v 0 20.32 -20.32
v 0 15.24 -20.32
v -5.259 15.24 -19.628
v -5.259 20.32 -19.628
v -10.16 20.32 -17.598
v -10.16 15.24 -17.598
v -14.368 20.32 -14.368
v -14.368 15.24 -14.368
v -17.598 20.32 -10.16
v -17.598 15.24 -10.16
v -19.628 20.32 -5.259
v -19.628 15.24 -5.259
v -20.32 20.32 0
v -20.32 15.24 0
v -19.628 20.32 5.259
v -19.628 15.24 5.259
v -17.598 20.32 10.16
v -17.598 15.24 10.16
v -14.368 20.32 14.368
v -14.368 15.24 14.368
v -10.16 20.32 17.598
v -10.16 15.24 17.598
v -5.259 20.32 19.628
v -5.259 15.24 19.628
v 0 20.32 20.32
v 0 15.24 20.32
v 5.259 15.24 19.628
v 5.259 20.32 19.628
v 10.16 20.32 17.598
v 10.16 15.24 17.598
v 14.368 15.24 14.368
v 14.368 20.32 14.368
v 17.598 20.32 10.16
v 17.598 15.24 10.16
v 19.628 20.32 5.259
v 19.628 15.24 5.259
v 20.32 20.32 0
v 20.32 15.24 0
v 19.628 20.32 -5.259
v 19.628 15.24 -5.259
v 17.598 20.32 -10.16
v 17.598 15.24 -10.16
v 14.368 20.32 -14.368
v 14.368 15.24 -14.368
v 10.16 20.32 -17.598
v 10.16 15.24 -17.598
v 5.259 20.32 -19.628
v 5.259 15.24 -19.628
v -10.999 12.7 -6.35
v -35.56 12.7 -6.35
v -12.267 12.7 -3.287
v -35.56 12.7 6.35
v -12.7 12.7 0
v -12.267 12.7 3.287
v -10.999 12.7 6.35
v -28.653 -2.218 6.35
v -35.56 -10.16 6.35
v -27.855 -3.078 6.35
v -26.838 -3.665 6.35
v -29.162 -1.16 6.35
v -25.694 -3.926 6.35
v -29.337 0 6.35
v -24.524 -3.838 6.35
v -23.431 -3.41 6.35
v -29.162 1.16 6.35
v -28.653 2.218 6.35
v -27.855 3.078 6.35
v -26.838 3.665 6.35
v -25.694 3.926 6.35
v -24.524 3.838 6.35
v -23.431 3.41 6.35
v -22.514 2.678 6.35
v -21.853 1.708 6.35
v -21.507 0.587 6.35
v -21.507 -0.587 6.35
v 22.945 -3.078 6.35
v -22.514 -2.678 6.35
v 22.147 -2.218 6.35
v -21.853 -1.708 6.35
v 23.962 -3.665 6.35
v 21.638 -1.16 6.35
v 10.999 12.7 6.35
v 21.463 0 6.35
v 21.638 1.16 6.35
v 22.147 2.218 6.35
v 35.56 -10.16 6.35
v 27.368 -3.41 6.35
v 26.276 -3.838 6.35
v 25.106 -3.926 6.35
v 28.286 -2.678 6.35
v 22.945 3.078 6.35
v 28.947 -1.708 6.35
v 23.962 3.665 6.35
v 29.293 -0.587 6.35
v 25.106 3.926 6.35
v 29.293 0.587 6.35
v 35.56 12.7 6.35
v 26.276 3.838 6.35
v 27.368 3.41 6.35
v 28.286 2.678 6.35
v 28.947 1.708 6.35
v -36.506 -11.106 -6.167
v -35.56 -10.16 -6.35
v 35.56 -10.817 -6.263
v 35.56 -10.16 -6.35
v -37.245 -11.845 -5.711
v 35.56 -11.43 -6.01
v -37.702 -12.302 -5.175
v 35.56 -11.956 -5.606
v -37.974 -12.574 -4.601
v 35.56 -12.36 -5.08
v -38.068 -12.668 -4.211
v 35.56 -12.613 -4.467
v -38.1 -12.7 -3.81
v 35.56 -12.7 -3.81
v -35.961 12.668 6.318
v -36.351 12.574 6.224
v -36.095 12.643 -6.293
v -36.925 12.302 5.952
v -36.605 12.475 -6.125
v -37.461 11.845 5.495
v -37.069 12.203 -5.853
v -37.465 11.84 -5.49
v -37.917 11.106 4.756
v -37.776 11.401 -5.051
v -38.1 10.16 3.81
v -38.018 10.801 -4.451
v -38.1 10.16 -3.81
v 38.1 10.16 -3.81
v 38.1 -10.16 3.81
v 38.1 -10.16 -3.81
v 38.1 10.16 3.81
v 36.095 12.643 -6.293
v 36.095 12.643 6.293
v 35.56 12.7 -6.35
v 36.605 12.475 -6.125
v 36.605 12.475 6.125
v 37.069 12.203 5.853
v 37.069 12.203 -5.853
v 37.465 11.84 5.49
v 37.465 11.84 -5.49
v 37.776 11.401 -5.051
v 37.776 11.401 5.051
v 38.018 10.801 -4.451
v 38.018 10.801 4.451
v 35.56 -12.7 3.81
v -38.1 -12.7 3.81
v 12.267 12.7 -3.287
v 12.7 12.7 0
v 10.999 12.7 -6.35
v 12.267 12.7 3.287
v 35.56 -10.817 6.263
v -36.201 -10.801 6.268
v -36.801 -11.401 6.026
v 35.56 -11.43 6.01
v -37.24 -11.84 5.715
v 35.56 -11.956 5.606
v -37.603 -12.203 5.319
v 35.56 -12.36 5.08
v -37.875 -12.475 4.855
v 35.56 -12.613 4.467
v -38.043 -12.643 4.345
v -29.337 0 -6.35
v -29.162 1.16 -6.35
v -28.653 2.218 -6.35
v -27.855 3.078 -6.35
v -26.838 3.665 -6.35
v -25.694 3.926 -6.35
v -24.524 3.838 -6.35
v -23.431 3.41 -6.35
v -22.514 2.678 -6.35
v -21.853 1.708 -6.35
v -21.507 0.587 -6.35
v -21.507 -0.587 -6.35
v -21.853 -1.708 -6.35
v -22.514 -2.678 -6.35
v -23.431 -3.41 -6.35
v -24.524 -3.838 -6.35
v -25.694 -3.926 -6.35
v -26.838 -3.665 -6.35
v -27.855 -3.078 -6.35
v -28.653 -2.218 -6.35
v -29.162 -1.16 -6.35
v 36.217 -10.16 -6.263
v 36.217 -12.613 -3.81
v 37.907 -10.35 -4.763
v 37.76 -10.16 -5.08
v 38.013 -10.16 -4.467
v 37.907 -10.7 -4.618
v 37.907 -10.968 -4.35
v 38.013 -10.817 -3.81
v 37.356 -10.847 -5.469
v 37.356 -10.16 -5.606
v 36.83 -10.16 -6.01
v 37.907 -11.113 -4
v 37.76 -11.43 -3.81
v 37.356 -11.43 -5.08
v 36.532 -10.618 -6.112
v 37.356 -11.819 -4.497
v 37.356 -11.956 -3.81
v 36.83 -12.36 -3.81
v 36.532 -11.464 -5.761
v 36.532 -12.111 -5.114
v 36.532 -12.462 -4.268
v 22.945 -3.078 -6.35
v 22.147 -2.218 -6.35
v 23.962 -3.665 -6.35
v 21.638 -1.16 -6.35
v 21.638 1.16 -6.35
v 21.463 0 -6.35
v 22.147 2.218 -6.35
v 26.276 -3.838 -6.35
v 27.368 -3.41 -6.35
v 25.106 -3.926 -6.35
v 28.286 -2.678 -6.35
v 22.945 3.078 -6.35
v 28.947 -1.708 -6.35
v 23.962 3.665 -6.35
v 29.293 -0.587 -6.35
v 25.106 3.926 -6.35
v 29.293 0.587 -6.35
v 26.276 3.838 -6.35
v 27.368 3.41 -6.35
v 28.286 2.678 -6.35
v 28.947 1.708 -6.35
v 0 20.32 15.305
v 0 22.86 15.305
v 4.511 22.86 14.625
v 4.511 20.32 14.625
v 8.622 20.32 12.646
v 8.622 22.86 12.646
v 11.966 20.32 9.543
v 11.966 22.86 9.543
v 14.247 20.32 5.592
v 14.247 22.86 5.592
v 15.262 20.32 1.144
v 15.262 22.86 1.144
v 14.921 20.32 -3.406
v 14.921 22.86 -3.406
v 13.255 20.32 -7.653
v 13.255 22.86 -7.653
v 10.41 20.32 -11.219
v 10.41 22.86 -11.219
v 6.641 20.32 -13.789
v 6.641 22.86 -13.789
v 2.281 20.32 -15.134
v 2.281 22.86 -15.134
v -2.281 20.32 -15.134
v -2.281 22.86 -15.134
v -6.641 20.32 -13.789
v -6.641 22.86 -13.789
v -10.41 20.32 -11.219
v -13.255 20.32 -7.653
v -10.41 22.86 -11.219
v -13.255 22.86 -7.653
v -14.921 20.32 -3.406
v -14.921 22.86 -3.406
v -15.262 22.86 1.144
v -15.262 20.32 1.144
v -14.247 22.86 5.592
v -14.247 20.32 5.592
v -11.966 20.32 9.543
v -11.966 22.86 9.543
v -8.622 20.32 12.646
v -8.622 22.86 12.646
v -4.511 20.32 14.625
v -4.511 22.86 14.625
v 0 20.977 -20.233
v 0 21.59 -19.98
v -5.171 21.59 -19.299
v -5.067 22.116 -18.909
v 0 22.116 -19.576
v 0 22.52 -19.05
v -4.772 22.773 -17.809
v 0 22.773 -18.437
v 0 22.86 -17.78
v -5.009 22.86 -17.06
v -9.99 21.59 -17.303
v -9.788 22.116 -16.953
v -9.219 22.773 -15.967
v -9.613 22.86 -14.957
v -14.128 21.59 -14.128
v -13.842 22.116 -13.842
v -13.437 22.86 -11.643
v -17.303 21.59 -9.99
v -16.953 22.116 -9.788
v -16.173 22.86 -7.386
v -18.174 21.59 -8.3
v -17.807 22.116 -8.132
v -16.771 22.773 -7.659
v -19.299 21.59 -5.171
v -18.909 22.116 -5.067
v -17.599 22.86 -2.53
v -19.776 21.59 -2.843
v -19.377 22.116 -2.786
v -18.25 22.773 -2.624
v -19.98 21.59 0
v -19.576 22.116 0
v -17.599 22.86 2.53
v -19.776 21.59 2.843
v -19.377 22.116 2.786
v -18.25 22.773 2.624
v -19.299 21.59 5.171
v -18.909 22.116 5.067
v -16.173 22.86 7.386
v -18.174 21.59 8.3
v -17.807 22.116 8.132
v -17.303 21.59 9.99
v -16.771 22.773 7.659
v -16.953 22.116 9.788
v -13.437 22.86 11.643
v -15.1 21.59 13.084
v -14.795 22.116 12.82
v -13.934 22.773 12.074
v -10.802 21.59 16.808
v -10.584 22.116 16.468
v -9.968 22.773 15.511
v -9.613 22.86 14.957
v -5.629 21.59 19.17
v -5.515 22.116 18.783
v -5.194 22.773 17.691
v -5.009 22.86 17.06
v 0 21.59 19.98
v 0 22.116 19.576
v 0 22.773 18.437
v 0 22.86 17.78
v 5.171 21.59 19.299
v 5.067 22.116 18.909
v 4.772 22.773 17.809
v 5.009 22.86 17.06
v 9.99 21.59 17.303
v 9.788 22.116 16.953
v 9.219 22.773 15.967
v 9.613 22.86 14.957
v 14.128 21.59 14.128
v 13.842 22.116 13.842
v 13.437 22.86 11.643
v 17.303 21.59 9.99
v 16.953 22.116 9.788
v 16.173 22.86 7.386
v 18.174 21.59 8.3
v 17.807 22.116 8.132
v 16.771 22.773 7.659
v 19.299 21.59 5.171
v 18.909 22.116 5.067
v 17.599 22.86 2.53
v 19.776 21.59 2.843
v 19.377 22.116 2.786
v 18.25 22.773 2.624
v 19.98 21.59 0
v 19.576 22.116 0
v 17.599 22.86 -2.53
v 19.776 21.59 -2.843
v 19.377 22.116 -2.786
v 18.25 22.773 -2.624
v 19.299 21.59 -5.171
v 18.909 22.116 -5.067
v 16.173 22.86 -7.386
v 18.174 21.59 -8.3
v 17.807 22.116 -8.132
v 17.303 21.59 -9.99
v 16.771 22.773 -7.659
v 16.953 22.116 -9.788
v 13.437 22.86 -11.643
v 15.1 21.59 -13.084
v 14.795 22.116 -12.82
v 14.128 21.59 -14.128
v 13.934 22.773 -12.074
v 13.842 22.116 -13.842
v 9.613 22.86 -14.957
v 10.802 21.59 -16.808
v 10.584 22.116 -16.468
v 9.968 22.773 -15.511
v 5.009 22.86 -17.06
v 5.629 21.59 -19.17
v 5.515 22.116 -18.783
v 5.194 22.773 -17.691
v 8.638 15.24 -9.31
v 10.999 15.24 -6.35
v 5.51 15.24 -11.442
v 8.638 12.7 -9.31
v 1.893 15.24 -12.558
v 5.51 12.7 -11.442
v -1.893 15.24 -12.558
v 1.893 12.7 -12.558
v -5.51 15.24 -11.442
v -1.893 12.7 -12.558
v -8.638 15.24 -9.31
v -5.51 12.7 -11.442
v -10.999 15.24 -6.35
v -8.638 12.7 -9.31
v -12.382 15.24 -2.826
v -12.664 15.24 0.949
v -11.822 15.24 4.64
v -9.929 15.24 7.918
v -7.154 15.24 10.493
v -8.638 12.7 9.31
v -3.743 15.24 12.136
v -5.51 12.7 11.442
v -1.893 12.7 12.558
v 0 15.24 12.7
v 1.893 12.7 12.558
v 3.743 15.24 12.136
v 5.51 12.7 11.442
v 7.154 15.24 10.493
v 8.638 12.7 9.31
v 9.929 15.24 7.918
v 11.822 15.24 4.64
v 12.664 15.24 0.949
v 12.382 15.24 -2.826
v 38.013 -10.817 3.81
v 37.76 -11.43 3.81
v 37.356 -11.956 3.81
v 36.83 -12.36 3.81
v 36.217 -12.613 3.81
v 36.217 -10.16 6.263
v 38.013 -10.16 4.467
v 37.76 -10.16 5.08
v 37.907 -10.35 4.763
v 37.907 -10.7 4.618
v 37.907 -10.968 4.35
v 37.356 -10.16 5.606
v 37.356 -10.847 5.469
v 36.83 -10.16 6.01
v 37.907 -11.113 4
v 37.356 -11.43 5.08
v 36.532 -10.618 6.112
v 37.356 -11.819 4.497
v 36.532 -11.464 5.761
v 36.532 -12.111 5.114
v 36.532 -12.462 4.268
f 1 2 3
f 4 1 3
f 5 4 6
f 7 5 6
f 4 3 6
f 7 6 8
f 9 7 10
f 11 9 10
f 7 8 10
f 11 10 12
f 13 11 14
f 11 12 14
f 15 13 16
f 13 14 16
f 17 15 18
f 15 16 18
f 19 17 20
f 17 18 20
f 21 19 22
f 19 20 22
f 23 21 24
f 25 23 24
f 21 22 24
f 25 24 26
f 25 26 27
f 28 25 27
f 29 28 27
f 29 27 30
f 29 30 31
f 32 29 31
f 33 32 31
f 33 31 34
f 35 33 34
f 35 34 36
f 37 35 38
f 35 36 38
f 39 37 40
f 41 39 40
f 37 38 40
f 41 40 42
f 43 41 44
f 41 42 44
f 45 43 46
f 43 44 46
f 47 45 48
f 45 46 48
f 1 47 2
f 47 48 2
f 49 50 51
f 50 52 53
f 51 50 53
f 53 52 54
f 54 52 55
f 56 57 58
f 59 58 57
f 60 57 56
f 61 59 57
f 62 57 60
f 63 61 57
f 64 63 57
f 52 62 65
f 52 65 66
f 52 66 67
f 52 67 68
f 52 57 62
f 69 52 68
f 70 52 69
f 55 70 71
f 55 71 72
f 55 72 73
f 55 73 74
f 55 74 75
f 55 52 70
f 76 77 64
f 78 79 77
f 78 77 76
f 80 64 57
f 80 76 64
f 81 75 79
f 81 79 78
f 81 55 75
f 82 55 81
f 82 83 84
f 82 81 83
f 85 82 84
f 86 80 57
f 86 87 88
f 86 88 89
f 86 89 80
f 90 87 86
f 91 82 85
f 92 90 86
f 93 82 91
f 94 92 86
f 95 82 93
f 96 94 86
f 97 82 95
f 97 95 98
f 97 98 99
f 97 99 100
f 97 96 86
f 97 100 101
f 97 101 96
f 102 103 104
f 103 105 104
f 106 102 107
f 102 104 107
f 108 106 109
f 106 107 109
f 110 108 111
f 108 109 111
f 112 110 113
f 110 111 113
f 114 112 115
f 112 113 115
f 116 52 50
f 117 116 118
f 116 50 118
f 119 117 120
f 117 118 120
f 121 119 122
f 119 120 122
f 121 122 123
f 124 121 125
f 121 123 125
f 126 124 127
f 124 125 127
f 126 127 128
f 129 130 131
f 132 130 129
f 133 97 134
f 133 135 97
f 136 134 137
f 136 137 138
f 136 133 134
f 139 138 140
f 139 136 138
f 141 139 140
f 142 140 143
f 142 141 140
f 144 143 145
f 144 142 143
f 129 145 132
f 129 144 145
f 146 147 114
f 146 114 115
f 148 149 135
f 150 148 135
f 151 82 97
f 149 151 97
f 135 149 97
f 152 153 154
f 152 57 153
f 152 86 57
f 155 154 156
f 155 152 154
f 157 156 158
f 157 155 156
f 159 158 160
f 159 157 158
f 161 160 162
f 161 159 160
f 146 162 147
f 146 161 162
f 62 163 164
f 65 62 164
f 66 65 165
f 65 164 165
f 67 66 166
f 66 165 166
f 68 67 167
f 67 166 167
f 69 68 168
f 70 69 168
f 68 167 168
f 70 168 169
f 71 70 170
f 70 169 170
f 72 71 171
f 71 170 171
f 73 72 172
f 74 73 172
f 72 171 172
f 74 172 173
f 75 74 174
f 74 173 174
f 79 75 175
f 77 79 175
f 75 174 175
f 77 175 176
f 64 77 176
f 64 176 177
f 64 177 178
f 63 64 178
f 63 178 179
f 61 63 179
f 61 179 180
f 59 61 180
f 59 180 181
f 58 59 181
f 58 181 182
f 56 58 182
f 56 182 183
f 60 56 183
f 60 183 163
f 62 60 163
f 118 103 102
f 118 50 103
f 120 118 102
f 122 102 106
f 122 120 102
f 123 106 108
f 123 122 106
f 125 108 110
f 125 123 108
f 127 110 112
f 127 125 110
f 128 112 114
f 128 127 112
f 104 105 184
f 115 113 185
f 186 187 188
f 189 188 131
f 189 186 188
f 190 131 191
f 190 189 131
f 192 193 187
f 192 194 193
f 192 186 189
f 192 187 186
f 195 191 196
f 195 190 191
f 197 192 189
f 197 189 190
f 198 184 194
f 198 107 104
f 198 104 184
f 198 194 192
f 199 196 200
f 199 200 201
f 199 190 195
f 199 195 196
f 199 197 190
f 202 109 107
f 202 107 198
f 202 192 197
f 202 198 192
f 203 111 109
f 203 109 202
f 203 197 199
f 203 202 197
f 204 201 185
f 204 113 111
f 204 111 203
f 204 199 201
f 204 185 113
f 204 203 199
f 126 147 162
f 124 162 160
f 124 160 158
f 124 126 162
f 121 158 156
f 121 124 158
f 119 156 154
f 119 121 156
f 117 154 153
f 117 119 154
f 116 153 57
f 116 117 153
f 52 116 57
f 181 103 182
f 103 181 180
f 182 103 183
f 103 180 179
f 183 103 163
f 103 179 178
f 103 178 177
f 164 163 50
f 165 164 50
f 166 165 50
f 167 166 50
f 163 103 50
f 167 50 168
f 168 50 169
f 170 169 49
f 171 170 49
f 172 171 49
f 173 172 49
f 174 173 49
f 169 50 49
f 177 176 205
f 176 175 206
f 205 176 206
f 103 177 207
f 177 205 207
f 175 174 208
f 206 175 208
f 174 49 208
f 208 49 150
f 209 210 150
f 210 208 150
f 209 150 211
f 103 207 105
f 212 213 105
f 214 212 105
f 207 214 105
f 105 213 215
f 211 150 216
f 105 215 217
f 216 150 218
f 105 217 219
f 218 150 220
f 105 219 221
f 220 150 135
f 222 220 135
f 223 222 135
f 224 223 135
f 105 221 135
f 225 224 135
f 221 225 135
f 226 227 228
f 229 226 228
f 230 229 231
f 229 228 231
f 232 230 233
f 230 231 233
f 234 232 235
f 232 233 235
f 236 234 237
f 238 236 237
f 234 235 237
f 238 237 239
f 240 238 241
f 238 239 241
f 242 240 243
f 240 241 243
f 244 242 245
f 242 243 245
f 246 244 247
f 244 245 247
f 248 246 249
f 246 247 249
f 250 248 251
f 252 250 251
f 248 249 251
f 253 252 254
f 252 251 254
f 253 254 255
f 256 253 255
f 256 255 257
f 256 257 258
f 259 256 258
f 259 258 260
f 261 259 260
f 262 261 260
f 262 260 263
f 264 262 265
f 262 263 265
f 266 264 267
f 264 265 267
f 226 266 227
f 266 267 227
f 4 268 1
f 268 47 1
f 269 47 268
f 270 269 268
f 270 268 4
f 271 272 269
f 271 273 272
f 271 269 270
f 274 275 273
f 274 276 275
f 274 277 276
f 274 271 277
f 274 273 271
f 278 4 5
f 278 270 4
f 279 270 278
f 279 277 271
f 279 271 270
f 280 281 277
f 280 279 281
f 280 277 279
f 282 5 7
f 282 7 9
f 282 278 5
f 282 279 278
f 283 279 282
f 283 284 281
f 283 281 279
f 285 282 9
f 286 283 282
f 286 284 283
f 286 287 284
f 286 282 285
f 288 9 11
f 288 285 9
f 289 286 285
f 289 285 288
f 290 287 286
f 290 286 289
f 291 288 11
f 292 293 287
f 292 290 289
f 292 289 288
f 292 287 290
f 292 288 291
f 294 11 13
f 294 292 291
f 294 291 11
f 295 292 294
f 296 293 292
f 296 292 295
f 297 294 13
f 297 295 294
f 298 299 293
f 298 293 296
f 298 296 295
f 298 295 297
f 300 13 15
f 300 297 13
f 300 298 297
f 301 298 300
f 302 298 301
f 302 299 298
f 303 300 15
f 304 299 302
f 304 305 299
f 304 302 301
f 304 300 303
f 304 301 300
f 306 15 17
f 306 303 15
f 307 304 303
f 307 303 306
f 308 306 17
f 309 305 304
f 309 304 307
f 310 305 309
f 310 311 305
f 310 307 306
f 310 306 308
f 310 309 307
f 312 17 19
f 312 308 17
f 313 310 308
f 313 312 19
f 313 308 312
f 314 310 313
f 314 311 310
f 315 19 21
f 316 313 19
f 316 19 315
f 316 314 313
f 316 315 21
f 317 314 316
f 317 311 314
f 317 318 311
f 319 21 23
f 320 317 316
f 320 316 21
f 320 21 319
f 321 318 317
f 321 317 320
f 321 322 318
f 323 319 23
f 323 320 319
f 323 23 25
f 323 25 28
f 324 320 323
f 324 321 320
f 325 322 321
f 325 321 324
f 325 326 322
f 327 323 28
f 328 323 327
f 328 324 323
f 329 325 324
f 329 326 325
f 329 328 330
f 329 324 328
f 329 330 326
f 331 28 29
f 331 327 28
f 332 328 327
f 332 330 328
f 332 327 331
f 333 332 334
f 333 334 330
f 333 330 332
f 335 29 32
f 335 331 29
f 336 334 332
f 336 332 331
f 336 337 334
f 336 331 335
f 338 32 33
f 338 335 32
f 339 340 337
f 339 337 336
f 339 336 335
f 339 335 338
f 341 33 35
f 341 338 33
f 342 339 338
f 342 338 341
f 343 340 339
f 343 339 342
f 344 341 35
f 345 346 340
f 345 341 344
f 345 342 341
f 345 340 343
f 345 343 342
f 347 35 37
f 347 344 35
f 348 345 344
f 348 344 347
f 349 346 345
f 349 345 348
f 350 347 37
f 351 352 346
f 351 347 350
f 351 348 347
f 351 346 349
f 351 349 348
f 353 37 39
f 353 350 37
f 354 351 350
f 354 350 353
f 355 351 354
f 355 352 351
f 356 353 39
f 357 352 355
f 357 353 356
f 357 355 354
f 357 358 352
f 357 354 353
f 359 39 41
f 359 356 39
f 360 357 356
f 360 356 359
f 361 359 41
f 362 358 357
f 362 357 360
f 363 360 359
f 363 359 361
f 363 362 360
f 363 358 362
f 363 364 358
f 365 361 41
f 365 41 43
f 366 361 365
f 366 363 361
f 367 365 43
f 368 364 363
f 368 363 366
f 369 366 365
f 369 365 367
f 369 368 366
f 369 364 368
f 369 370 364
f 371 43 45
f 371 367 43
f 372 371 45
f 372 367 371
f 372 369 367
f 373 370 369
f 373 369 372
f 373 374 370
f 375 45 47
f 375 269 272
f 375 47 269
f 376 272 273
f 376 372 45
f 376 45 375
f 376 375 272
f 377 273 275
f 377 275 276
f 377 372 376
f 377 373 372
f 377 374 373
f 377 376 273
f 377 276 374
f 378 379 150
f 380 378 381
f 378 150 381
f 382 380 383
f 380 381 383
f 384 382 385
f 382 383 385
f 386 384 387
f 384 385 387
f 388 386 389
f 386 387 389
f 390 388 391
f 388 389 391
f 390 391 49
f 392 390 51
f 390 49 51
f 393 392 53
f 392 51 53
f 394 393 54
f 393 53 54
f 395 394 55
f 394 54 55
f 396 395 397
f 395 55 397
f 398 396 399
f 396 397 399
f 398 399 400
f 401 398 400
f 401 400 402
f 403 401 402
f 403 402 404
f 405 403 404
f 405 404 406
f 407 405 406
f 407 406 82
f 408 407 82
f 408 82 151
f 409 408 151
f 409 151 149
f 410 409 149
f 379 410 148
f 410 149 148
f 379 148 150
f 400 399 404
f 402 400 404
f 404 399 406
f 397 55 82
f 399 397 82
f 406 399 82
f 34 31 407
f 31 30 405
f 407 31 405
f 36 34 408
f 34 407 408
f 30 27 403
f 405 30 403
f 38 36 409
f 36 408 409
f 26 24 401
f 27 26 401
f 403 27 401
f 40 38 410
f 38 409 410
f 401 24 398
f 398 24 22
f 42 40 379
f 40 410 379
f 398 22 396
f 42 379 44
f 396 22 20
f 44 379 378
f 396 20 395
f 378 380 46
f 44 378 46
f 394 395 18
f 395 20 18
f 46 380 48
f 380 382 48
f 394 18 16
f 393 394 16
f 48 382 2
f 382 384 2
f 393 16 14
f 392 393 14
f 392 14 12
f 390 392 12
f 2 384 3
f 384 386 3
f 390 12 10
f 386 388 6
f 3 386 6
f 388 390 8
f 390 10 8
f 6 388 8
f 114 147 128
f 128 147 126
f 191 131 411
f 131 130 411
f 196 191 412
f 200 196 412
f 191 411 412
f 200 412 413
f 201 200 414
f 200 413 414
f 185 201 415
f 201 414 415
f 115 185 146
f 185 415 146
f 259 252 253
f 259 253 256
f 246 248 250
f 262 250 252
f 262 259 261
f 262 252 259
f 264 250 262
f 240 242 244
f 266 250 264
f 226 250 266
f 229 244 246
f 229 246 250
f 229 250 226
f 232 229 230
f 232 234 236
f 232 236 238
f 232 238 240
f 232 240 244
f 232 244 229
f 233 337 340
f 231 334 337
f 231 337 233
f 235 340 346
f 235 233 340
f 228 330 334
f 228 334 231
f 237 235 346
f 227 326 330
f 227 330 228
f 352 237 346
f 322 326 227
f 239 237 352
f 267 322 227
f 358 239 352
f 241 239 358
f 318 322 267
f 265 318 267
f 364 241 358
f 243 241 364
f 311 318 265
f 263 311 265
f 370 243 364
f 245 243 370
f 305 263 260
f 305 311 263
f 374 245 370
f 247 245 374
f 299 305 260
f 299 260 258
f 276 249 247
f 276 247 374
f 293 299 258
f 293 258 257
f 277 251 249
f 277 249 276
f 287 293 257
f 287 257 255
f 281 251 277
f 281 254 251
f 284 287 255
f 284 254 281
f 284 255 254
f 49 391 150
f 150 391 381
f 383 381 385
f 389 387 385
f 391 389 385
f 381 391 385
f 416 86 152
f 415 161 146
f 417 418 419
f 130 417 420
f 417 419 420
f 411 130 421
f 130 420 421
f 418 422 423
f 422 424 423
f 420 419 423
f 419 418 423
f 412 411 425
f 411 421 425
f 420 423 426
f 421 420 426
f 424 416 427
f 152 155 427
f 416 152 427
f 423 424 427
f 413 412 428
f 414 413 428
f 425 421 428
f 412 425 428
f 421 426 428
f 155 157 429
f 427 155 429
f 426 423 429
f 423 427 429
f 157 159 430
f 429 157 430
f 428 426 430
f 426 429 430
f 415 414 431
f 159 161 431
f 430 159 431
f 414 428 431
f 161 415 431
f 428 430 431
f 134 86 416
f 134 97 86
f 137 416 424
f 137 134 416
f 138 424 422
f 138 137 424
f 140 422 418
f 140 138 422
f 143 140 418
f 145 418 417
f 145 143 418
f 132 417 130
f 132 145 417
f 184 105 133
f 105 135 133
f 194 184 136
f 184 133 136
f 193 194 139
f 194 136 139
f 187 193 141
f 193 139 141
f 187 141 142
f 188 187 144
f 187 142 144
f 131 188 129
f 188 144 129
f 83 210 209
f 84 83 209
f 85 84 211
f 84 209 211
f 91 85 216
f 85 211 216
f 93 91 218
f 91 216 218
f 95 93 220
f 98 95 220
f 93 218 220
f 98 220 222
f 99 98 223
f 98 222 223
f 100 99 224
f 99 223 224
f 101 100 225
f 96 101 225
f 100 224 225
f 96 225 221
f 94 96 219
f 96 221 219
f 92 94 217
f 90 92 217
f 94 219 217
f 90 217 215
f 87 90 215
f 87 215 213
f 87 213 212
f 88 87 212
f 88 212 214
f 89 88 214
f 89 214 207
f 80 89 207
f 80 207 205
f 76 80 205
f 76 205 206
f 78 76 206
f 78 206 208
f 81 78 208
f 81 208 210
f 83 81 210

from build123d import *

# Parameters (mm, degrees)
SKETCH1_W                      = 76.2
SKETCH1_H                      = 25.4
BOSS_EXTRUDE1_DEPTH            = 6.35
SKETCH5_R                      = 12.7
BOSS_EXTRUDE3_DEPTH            = 2.54
SKETCH7_R                      = 20.32
BOSS_EXTRUDE4_DEPTH            = 7.62
SKETCH8_R                      = 15.305053728
CUT_EXTRUDE1_DEPTH             = 2.54
FILLET3_R                      = 2.54
FILLET4_R                      = 2.54
F_97_0_31_DIAMETER_HOLE1_D     = 7.874
F_97_0_31_DIAMETER_HOLE1_DEPTH = 25.4
F_97_0_31_DIAMETER_HOLE1_TIP   = 2.365588257


with BuildPart() as part:
    # Sketch1 → Boss-Extrude1 (new, symmetric)
    with BuildSketch(Plane.XY):
        Rectangle(SKETCH1_W, SKETCH1_H)
    extrude(amount=BOSS_EXTRUDE1_DEPTH, both=True)

    # Sketch5 → Boss-Extrude3 (add)
    with BuildSketch(Plane(origin=(0, 12.7, 0), x_dir=(1, 0, 0), z_dir=(0, 1, 0))):
        with Locations(Location((0, 0, 0), (0, 0, 30))):
            Circle(SKETCH5_R)
    extrude(amount=BOSS_EXTRUDE3_DEPTH)

    # Sketch7 → Boss-Extrude4 (add)
    with BuildSketch(Plane(origin=(0, 15.24, 0), x_dir=(1, 0, 0), z_dir=(0, 1, 0))):
        with Locations(Location((0, 0, 0), (0, 0, 90))):
            Circle(SKETCH7_R)
    extrude(amount=BOSS_EXTRUDE4_DEPTH)

    # Sketch8 → Cut-Extrude1 (cut)
    with BuildSketch(Plane(origin=(0, 22.86, 0), x_dir=(1, 0, 0), z_dir=(0, 1, 0))):
        with Locations(Location((0, 0, 0), (0, 0, 270))):
            Circle(SKETCH8_R)
    extrude(amount=-CUT_EXTRUDE1_DEPTH, mode=Mode.SUBTRACT)

    # Fillet3
    fillet3_edges = [part.edges().sort_by_distance(p)[0] for p in [
        (0, 22.86, 20.32),
    ]]
    fillet(fillet3_edges, radius=FILLET3_R)

    # Fillet4
    fillet4_edges = [part.edges().sort_by_distance(p)[0] for p in [
        (-38.1, 0, 6.35),
        (0, -12.7, 6.35),
        (38.1, 0, 6.35),
        (0, -12.7, -6.35),
        (-38.1, 0, -6.35),
        (38.1, 0, -6.35),
        (38.1, -12.7, 0),
        (-38.1, 12.7, 0),
        (38.1, 12.7, 0),
    ]]
    fillet(fillet4_edges, radius=FILLET4_R)

    # #97 (0.31) Diameter Hole1
    with Locations(Plane.XY.offset(6.35)):
        with Locations((25.4, 0), (-25.4, 0)):
            Hole(F_97_0_31_DIAMETER_HOLE1_D / 2, depth=F_97_0_31_DIAMETER_HOLE1_DEPTH)
            with Locations((0, 0, -(F_97_0_31_DIAMETER_HOLE1_DEPTH + F_97_0_31_DIAMETER_HOLE1_TIP / 2))):  # 118° drill point
                Cone(0, F_97_0_31_DIAMETER_HOLE1_D / 2, F_97_0_31_DIAMETER_HOLE1_TIP, mode=Mode.SUBTRACT)


solid = part.part
